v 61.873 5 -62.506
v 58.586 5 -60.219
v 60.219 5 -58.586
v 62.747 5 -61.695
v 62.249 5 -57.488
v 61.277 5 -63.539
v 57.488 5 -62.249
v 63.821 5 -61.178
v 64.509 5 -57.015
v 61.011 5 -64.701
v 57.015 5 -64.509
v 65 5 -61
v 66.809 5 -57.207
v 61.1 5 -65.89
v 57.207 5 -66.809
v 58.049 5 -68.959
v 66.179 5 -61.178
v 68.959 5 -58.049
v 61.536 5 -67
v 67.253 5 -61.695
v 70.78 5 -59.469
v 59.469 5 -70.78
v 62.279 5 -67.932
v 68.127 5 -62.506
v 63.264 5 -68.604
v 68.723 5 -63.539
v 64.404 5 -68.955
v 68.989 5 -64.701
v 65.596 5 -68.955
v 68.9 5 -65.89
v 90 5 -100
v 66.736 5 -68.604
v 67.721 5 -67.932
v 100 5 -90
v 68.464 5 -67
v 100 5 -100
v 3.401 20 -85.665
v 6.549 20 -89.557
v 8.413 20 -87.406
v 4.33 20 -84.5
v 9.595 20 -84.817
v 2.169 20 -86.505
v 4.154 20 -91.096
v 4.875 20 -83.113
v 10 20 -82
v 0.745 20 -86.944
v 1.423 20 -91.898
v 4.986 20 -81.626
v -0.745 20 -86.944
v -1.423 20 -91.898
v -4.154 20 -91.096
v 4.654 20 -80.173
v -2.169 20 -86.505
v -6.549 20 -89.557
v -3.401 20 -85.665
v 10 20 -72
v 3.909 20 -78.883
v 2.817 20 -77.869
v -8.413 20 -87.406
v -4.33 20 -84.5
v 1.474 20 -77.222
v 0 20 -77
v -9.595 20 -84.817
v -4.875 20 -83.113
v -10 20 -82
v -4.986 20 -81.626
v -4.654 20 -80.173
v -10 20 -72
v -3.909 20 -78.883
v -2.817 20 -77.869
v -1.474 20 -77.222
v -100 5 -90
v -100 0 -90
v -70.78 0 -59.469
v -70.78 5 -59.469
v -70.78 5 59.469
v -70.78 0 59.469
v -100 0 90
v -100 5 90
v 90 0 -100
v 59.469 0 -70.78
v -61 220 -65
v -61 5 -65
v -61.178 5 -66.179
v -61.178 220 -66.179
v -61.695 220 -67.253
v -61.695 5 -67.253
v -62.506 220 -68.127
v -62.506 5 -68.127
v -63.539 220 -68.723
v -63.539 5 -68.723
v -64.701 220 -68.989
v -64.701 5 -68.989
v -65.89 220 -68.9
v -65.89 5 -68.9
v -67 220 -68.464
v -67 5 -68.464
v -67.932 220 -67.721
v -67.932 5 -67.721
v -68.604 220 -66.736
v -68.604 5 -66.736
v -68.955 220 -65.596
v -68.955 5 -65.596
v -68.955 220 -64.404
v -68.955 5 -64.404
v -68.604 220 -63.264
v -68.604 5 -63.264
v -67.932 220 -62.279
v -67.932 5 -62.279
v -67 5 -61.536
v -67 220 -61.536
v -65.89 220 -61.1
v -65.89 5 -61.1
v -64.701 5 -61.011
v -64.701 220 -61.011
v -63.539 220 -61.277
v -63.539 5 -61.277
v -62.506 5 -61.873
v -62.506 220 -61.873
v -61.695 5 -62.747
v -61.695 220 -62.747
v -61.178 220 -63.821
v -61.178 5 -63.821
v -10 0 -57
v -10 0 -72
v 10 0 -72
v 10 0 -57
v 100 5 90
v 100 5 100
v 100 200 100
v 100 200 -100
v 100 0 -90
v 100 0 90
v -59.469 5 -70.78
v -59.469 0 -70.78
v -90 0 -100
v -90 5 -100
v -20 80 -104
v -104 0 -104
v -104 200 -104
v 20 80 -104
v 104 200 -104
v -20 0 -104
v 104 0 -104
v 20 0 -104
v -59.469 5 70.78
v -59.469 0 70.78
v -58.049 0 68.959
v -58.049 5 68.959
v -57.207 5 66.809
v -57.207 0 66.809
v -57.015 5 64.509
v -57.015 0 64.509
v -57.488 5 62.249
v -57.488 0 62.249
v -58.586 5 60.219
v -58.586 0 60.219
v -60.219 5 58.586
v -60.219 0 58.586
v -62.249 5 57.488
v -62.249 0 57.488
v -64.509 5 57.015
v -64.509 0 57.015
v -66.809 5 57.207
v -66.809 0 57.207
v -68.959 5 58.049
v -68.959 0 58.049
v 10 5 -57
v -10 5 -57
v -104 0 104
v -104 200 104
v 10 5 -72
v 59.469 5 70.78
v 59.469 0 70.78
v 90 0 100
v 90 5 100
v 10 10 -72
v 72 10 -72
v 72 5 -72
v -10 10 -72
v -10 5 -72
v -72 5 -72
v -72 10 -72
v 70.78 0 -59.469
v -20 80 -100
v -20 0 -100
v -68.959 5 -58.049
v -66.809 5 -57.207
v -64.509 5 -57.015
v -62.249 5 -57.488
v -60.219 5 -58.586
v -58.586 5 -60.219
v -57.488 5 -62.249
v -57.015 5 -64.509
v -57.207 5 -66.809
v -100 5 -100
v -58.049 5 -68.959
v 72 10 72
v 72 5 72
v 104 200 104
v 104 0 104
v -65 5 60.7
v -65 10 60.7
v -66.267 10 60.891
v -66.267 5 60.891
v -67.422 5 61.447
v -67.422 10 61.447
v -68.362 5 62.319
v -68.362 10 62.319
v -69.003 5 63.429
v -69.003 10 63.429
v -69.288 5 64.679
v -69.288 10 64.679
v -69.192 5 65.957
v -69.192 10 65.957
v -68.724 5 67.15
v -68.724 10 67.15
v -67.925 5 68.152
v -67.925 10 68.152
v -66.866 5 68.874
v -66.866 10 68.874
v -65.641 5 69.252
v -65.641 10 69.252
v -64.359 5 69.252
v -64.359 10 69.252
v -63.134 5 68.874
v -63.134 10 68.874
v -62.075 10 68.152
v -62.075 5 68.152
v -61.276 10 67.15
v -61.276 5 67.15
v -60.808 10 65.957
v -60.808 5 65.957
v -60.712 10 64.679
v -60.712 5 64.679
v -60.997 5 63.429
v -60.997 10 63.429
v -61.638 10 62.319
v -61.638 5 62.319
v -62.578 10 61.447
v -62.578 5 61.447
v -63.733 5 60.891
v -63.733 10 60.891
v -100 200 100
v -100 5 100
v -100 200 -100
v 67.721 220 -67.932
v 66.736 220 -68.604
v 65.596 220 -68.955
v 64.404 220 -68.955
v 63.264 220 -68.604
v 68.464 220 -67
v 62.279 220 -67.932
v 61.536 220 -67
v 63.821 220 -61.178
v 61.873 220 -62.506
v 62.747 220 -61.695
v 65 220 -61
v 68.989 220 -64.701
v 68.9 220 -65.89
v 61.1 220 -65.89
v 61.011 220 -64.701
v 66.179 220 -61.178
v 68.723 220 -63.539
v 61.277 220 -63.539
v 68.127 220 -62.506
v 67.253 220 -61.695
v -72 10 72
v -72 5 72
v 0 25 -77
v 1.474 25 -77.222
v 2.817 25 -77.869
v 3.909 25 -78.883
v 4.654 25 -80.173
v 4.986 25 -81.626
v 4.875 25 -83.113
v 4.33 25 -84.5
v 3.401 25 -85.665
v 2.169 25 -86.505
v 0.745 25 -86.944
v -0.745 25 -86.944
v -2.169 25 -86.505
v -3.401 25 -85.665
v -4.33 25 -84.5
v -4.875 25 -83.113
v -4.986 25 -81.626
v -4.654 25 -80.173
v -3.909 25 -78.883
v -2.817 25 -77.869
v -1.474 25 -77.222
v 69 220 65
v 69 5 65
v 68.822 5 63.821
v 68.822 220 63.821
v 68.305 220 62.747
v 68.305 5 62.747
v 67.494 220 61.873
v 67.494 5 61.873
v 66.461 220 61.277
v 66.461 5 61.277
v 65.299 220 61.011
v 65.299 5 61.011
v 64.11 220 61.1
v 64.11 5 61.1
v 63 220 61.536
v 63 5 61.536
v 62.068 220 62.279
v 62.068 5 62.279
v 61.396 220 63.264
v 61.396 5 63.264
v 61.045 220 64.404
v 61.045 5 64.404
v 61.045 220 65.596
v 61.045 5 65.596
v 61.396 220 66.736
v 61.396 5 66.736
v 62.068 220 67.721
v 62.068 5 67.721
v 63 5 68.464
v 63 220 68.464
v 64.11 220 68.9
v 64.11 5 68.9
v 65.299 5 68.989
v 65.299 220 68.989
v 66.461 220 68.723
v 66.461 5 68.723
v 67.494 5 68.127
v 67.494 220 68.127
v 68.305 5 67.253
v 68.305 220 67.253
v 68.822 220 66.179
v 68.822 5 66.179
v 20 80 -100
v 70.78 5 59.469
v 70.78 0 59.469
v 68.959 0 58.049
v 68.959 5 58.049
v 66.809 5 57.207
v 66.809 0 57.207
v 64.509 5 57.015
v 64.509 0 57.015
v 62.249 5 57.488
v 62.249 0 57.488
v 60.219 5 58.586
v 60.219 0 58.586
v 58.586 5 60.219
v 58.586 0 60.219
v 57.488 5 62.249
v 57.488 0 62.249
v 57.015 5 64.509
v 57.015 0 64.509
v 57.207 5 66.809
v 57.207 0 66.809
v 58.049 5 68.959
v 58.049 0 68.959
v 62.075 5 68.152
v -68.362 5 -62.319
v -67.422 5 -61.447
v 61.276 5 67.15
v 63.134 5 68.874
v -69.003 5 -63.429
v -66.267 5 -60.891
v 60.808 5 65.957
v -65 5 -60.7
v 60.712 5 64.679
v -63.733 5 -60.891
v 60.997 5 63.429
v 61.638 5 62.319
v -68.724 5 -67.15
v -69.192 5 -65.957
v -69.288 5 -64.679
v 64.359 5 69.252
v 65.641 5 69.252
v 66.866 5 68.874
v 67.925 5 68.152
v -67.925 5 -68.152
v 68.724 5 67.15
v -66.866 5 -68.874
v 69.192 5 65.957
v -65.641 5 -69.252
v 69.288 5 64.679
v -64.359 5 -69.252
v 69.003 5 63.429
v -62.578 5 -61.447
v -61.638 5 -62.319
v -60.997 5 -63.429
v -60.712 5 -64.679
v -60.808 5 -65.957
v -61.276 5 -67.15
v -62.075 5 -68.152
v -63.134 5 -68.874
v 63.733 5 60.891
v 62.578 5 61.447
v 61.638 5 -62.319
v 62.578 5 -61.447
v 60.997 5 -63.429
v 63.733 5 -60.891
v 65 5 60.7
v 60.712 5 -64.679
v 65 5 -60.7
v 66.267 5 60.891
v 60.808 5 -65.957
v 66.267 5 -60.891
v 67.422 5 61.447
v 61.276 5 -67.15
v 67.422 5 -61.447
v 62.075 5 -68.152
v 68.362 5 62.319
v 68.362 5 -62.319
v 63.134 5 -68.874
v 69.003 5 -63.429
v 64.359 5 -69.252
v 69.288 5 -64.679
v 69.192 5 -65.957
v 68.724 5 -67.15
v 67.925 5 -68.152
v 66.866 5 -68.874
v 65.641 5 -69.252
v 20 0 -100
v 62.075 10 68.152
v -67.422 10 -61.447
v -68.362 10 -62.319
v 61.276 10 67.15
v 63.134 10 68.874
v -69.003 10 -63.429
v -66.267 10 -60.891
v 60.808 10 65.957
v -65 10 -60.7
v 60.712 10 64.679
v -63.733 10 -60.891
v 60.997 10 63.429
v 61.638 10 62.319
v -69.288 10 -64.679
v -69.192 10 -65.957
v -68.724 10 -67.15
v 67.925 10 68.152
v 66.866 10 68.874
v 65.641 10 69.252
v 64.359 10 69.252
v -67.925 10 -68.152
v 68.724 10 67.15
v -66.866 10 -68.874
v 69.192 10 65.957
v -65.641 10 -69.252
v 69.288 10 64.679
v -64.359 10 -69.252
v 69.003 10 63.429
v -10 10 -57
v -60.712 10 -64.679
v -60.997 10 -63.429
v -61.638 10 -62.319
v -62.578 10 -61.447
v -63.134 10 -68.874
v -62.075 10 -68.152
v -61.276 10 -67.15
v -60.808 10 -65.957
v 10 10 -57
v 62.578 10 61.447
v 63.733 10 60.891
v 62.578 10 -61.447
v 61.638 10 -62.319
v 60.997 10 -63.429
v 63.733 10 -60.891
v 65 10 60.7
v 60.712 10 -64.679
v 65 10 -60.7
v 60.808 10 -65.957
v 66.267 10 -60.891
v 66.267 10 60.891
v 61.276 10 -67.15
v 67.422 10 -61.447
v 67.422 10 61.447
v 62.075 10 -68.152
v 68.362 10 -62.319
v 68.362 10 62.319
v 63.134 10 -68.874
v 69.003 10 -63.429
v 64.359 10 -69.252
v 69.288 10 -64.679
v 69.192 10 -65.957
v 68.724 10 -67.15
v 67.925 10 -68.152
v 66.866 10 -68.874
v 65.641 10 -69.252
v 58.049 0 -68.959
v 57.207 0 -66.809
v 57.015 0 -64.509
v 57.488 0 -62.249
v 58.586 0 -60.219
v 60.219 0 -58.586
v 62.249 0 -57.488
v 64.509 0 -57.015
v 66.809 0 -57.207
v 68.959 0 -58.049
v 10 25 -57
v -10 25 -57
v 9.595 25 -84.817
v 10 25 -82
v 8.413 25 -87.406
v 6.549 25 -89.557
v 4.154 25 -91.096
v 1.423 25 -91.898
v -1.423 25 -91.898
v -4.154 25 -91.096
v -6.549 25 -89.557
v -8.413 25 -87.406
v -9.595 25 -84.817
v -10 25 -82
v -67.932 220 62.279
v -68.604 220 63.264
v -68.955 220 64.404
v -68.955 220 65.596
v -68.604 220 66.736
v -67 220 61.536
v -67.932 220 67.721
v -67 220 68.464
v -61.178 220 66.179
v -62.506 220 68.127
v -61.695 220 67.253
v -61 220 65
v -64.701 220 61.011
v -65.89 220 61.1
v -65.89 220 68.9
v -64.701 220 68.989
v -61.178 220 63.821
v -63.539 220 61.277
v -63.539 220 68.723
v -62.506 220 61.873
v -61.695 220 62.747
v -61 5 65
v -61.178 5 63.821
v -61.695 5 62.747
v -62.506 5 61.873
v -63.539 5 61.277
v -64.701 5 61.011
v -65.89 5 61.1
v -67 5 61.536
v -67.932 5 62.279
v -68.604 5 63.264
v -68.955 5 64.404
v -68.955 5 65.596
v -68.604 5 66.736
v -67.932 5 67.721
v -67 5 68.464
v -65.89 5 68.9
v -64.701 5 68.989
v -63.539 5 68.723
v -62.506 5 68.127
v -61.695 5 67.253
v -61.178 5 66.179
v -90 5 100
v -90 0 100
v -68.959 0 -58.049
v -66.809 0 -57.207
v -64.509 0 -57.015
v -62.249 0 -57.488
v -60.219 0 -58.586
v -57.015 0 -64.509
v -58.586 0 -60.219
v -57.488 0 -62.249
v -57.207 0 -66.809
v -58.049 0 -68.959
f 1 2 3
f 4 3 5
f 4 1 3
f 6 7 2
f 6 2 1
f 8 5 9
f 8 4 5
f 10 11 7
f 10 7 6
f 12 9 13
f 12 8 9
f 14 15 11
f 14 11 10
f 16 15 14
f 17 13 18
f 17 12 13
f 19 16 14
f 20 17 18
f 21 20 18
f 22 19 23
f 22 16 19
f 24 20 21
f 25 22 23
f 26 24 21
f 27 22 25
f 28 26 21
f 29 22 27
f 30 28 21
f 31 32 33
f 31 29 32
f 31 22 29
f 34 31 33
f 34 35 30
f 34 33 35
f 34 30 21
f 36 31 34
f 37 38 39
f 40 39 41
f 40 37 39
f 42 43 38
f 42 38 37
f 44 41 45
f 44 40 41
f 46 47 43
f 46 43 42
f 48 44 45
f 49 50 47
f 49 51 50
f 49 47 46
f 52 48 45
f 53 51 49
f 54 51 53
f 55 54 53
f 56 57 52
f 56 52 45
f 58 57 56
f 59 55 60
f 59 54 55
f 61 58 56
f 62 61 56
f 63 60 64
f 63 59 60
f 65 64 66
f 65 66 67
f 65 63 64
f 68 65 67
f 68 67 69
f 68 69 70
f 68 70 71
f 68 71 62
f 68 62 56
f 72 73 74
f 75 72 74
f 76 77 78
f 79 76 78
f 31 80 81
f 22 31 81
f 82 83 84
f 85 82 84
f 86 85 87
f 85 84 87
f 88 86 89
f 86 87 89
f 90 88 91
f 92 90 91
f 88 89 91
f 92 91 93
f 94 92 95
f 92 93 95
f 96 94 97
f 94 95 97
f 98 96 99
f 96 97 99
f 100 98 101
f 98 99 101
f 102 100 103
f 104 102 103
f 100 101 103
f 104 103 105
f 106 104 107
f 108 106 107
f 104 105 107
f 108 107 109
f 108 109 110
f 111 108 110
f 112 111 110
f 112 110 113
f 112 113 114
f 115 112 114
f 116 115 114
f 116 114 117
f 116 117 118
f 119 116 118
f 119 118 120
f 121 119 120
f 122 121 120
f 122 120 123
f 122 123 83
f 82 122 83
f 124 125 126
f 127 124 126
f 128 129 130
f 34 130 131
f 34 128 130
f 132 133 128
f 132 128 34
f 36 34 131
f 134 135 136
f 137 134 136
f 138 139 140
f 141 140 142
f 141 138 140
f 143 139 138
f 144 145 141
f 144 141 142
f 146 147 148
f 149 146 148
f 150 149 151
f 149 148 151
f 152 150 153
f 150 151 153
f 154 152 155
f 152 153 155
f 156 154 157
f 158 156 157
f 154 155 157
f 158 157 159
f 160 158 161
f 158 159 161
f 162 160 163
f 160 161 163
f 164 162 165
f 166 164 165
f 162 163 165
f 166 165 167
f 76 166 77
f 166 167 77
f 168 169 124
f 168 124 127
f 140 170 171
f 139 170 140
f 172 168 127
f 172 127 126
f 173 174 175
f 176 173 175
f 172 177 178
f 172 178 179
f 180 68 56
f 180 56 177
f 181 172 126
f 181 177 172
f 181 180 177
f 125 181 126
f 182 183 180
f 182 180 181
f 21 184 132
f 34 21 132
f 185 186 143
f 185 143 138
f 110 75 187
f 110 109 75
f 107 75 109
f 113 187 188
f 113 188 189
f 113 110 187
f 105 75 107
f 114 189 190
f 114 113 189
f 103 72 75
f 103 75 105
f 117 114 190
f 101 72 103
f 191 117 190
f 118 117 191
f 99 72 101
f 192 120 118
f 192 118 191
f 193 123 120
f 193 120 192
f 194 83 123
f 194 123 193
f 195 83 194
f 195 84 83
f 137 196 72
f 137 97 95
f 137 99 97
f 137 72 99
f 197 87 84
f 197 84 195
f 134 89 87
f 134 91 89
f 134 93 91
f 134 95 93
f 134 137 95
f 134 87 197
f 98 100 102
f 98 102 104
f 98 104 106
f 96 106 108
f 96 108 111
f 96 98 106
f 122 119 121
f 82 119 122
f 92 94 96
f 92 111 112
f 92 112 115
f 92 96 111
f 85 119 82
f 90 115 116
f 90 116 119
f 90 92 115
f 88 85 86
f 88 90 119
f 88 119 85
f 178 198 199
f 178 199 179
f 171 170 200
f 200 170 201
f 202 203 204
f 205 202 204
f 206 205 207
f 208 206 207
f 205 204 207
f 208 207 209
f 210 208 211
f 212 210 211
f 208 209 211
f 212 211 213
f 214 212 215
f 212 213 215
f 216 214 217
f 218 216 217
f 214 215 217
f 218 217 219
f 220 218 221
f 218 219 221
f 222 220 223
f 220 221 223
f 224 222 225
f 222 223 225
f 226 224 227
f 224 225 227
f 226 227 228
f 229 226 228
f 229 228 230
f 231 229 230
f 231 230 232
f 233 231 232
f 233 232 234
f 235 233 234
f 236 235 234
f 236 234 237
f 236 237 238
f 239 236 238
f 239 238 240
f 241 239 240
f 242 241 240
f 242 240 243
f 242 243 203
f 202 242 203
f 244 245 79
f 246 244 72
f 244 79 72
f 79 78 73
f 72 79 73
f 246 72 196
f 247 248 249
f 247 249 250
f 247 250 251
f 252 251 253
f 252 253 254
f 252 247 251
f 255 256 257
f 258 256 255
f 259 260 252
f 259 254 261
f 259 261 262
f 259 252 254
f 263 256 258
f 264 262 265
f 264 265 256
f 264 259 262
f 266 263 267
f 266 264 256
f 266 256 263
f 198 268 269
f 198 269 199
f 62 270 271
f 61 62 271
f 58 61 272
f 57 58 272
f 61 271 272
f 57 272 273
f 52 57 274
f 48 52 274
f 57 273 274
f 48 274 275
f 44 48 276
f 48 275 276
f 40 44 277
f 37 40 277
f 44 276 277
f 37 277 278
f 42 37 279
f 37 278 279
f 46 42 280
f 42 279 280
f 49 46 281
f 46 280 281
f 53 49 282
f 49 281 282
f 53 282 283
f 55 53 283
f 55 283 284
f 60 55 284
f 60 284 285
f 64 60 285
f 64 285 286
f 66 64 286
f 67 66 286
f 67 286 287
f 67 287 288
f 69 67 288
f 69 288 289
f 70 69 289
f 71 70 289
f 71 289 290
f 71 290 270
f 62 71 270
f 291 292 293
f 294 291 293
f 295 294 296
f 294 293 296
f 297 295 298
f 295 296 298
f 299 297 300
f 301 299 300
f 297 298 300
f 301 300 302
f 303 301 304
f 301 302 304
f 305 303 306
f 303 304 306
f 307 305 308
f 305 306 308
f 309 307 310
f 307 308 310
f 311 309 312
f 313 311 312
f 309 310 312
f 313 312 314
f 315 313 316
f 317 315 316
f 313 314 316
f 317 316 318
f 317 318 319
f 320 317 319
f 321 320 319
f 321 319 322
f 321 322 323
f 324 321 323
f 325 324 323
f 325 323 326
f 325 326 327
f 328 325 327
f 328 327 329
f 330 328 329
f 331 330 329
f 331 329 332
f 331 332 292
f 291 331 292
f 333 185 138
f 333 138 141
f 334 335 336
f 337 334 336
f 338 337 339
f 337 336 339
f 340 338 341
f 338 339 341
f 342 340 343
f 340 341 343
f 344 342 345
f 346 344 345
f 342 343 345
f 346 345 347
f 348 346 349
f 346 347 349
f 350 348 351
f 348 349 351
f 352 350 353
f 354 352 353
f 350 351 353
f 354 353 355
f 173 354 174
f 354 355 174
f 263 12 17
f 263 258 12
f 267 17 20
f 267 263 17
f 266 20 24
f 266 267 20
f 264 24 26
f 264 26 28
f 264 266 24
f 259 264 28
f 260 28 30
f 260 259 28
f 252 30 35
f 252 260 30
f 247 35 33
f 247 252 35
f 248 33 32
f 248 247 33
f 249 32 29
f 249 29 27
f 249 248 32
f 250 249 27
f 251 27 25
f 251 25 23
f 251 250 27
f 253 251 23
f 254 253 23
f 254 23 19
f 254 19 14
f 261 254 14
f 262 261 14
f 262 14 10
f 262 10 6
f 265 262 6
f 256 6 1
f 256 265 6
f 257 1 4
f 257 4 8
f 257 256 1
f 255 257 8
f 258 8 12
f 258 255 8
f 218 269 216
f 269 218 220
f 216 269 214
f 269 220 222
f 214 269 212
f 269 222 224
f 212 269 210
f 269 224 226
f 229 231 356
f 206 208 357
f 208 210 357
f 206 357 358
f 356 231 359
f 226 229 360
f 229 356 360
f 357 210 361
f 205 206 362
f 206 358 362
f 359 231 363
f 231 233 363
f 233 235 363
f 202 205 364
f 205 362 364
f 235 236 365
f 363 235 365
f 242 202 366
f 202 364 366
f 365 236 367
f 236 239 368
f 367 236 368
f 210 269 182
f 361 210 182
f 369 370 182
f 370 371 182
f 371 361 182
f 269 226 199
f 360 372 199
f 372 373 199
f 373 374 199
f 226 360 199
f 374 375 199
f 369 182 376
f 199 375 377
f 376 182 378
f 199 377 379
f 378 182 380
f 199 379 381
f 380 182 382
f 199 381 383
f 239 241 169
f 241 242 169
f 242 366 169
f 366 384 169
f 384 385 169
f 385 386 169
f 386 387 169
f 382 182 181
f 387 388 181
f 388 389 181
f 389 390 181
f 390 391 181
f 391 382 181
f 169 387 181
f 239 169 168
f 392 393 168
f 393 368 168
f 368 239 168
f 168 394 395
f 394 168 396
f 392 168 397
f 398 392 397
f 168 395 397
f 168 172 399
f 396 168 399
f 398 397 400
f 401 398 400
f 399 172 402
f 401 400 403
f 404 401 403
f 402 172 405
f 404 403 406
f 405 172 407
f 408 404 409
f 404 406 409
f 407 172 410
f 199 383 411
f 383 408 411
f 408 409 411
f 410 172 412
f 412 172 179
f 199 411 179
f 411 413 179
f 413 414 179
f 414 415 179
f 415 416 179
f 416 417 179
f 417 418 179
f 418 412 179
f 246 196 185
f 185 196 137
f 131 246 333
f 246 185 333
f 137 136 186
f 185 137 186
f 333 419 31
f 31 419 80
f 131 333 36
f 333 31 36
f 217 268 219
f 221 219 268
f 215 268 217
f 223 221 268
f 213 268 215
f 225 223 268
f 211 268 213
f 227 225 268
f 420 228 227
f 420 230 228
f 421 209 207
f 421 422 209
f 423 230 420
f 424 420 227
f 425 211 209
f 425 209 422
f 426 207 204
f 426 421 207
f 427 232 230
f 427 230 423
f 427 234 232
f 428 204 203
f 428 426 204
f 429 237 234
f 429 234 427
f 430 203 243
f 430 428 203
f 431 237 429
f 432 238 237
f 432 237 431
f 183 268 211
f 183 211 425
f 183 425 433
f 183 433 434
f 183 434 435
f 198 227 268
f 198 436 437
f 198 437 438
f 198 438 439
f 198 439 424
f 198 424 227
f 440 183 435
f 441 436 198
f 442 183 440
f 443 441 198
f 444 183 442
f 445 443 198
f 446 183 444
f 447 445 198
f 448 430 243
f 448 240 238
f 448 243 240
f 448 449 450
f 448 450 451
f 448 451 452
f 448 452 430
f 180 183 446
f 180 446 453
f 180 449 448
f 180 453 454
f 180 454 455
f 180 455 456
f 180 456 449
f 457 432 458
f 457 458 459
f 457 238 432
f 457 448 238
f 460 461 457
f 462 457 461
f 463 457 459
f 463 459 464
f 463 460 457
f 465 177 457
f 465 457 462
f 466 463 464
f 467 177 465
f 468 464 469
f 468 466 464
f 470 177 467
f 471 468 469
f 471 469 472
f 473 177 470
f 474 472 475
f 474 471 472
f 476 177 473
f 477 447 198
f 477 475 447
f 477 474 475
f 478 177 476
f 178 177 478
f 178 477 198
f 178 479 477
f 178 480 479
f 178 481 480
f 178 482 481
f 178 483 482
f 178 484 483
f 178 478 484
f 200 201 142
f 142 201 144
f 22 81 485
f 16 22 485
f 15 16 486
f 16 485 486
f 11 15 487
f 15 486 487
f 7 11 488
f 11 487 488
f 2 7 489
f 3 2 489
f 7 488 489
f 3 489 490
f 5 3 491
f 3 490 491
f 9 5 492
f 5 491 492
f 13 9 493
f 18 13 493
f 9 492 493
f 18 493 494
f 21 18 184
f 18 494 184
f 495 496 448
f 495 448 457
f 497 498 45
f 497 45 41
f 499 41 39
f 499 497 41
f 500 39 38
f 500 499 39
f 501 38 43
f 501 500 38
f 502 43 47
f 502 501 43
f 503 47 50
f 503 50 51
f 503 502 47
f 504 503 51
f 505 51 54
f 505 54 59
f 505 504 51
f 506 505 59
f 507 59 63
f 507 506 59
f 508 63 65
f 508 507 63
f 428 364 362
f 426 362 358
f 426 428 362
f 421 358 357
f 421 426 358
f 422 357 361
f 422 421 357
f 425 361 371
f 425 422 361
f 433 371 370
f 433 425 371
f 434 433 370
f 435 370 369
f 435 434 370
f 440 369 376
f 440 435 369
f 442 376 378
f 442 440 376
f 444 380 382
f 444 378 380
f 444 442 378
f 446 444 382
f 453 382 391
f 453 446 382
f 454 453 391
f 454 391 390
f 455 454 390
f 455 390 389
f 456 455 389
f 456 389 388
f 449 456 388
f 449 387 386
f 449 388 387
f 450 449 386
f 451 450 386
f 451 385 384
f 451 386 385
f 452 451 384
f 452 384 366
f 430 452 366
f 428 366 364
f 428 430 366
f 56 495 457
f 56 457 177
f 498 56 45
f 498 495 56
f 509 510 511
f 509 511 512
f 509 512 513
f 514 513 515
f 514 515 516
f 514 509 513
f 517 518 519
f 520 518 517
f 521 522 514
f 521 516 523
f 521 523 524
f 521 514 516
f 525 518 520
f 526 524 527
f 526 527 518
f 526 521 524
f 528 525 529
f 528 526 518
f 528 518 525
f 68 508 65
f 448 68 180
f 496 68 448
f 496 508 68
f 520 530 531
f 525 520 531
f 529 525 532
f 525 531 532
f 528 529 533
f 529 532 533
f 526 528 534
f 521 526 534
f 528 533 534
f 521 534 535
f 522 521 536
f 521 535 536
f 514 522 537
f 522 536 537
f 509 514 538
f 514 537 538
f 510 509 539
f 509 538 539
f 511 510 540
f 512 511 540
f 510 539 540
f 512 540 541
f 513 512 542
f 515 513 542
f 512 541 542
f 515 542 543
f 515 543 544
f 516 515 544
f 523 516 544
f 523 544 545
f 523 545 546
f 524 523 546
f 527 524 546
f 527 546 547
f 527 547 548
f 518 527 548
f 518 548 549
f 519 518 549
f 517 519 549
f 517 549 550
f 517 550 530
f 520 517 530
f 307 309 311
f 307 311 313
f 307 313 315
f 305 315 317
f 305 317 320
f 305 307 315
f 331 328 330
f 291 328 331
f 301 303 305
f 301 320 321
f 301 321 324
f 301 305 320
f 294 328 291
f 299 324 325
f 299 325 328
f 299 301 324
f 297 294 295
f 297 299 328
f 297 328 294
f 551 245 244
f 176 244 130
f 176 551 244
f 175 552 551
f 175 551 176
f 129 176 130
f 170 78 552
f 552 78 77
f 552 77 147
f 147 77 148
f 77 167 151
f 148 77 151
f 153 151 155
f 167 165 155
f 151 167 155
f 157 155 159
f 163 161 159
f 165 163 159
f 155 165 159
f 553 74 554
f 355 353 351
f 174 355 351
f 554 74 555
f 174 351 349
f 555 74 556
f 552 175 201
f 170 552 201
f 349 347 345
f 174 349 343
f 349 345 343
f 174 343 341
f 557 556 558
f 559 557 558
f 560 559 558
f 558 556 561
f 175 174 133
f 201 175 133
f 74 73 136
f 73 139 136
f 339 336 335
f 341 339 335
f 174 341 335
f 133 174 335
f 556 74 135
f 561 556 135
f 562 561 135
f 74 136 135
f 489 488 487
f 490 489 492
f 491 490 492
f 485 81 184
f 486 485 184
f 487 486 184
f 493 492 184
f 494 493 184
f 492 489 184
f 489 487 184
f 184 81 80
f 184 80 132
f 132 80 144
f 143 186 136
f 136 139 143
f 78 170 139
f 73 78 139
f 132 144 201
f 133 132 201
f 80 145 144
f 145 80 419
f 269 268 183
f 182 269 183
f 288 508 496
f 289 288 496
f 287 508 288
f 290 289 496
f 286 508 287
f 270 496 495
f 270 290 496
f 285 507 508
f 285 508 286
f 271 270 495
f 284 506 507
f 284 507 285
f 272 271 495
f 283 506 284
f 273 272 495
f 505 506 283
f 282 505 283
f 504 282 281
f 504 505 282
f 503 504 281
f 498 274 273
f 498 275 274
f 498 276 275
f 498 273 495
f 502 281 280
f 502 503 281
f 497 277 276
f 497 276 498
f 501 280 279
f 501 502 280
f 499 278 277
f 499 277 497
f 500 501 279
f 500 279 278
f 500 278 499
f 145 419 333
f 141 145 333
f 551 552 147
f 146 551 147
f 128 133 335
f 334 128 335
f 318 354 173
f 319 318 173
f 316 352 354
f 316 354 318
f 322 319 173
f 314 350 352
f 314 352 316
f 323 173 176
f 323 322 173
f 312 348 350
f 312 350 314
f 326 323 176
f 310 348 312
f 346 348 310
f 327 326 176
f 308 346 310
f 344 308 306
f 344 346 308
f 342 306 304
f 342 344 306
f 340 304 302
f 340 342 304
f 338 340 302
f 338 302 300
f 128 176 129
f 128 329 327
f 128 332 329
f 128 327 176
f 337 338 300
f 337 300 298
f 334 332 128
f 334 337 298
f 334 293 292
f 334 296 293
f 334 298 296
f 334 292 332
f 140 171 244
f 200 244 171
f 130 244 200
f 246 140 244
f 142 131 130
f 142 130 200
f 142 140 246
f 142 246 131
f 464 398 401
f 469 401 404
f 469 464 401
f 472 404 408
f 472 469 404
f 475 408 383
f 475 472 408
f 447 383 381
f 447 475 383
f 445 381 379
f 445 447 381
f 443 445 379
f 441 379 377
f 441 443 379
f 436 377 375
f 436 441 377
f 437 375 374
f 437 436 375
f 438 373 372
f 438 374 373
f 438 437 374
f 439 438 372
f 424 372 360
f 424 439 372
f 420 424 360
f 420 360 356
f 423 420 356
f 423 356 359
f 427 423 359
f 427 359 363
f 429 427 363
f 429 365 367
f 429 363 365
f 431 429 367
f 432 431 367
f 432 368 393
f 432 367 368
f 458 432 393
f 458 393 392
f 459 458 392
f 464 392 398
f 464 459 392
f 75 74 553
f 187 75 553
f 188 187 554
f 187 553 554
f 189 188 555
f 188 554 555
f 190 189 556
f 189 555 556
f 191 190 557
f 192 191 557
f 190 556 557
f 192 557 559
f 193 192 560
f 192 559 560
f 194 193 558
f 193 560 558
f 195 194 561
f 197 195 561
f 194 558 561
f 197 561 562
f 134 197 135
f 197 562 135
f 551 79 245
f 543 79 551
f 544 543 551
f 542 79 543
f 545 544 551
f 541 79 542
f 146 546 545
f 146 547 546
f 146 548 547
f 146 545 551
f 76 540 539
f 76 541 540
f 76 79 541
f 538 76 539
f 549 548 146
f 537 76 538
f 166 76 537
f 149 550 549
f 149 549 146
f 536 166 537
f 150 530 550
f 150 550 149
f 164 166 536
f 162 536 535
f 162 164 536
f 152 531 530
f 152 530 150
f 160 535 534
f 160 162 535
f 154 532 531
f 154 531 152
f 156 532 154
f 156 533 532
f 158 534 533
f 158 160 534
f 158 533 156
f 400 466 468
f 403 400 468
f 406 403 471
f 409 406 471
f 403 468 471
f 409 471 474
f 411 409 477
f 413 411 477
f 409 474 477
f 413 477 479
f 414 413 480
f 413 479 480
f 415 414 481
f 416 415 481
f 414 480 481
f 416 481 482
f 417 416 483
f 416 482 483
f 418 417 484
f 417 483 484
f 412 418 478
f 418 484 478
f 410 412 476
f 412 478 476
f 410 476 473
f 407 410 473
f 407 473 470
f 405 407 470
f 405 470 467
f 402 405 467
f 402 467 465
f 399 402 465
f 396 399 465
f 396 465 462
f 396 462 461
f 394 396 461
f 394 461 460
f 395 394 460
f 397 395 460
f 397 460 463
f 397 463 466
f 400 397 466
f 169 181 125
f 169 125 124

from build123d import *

# Parameters (mm, degrees)
SKETCH1_W                                  = 208
SKETCH1_H                                  = 208
SKETCH1_W_2                                = 200
SKETCH1_H_2                                = 200
BOSS_EXTRUDE1_DEPTH                        = 200
SKETCH3_W                                  = 40
SKETCH3_H                                  = 80
CUT_EXTRUDE1_DEPTH                         = 249.257930387
SKETCH4_W                                  = 144
SKETCH4_H                                  = 144
BOSS_EXTRUDE3_DEPTH                        = 5
BOSS_EXTRUDE4_DEPTH                        = 5
SKETCH4_5_R                                = 4
BOSS_EXTRUDE5_DEPTH                        = 210
BOSS_EXTRUDE5_DIRECTION_2_REACH            = 242.275
MIRROR2_OUTLINE_R                          = 4
MIRROR2_DEPTH                              = 220
MIRROR2_2_OUTLINE_R                        = 4
MIRROR2_2_DEPTH                            = 5
SKETCH8_R                                  = 10
BOSS_EXTRUDE7_DEPTH                        = 25
CUT_EXTRUDE3_DEPTH                         = 265.635598512
CUT_EXTRUDE3_DEPTH_BACK                    = 265.635598512
SKETCH11_R                                 = 5
CUT_EXTRUDE4_DEPTH                         = 245.247824965
SKETCH12_R                                 = 4.3
CUT_EXTRUDE5_DEPTH                         = 257.382526706
MIRROR3_AT_THE_SECOND_PLANE_COPY_1_SKETC_R = 4.3
MIRROR3_AT_THE_SECOND_PLANE_COPY_1_DEPTH   = 257.382526706


# Read off the part's stored shape, not the designer's step: Mirror2
with BuildPart() as part:
    # Sketch1 → Boss-Extrude1 (new body)
    with BuildSketch(Plane(origin=(0, 0, 0), x_dir=(1, 0, 0), z_dir=(0, 1, 0))):
        Rectangle(SKETCH1_W, SKETCH1_H)
        Rectangle(SKETCH1_W_2, SKETCH1_H_2, mode=Mode.SUBTRACT)
    extrude(amount=BOSS_EXTRUDE1_DEPTH)

    # Sketch3 → Cut-Extrude1 (cut, through all)
    with BuildSketch(Plane.XY):
        with Locations((0, 40)):
            Rectangle(SKETCH3_W, SKETCH3_H)
    extrude(amount=-CUT_EXTRUDE1_DEPTH, mode=Mode.SUBTRACT)

    # Sketch5 → Boss-Extrude4 (add)
    with BuildSketch(Plane(origin=(0, 0, 0), x_dir=(1, 0, 0), z_dir=(0, 1, 0))):
        with BuildLine():
            Line((90, 100), (59.468591297, 70.779577645))
            ThreePointArc((59.468591297, 70.779577645), (59.343145751, 59.343145751), (70.779577645, 59.468591297))
            Line((70.779577645, 59.468591297), (100, 90))
            Line((100, 90), (100, 100))
            Line((100, 100), (90, 100))
        make_face()
    extrude(amount=BOSS_EXTRUDE4_DEPTH)

    # Sketch4<5> → Boss-Extrude5 (add)
    with BuildSketch(Plane(origin=(0, 10, 0), x_dir=(1, 0, 0), z_dir=(0, 1, 0))):
        with Locations(Location((65, 65, 0), (0, 0, 270))):
            Circle(SKETCH4_5_R)
    extrude(amount=BOSS_EXTRUDE5_DEPTH)

    # Sketch4<5> → Boss-Extrude5 direction 2 (add, up to next)
    with BuildSketch(Plane(origin=(0, 10, 0), x_dir=(1, 0, 0), z_dir=(0, 1, 0)), mode=Mode.PRIVATE) as boss_extrude5_direction_2_sk1:
        with Locations(Location((65, 65, 0), (0, 0, 270))):
            Circle(SKETCH4_5_R)
    boss_extrude5_direction_2_tool1 = extrude(boss_extrude5_direction_2_sk1.sketch, amount=-BOSS_EXTRUDE5_DIRECTION_2_REACH, mode=Mode.PRIVATE) - part.part
    add(boss_extrude5_direction_2_tool1.solids().sort_by_distance((65, 10, -65))[0])



with BuildPart() as body_2:
    # Sketch4 → Boss-Extrude3 (new body)
    with BuildSketch(Plane(origin=(0, 10, 0), x_dir=(1, 0, 0), z_dir=(0, 1, 0))):
        Rectangle(SKETCH4_W, SKETCH4_H)
    extrude(amount=-BOSS_EXTRUDE3_DEPTH)

    # Sketch8 → Boss-Extrude7 (add, through all)
    with BuildSketch(Plane(origin=(0, 25, 0), x_dir=(1, 0, 0), z_dir=(0, 1, 0))):
        with Locations((0, 82)):
            Circle(SKETCH8_R)
        with BuildLine():
            Line((-10, 82), (-10, 57))
            Line((-10, 57), (10, 57))
            Line((10, 57), (10, 82))
            ThreePointArc((10, 82), (0, 72), (-10, 82))
        make_face()
    extrude(amount=-BOSS_EXTRUDE7_DEPTH)

    # Sketch10 → Cut-Extrude3 (cut, two sides: drawn at the far end of the back side and taken through both)
    with BuildSketch(Plane(origin=(0, 0, 0), x_dir=(0, 0, -1), z_dir=(1, 0, 0)).offset(-CUT_EXTRUDE3_DEPTH_BACK)):
        Polygon((665.474932894, 20), (92, 20), (72, 20), (72, 0), (72, -573.474932894), (883.01602778, -1384.490960674), (1476.490960674, -791.01602778), align=None)
    extrude(amount=CUT_EXTRUDE3_DEPTH + CUT_EXTRUDE3_DEPTH_BACK, mode=Mode.SUBTRACT)

    # Sketch11 → Cut-Extrude4 (cut, through all)
    with BuildSketch(Plane(origin=(0, 25, 0), x_dir=(1, 0, 0), z_dir=(0, 1, 0))):
        with Locations(Location((0, 82, 0), (0, 0, 270))):
            Circle(SKETCH11_R)
    extrude(amount=-CUT_EXTRUDE4_DEPTH, mode=Mode.SUBTRACT)

    # Sketch12 → Cut-Extrude5 (cut, through all)
    with BuildSketch(Plane(origin=(0, 10, 0), x_dir=(1, 0, 0), z_dir=(0, 1, 0))):
        with Locations(Location((65, 65, 0), (0, 0, 270))):
            Circle(SKETCH12_R)
    cut_extrude5 = extrude(amount=-CUT_EXTRUDE5_DEPTH, mode=Mode.SUBTRACT)

    # Mirror3: Cut-Extrude5 across plane
    add(cut_extrude5.mirror(Plane.XY), mode=Mode.SUBTRACT)

    # Mirror3 at the second plane: Cut-Extrude5 across plane
    add(cut_extrude5.mirror(Plane(origin=(0, 0, 0), x_dir=(0, 0, 1), z_dir=(1, 0, 0))), mode=Mode.SUBTRACT)

    # Mirror3 at the second plane copy 1 sketc → Mirror3 at the second plane copy 1 (cut, through all)
    with BuildSketch(Plane(origin=(0, 10, 0), x_dir=(-1, 0, 0), z_dir=(0, 1, 0))):
        with Locations(Location((65, 65, 0), (0, 0, 270))):
            Circle(MIRROR3_AT_THE_SECOND_PLANE_COPY_1_SKETC_R)
    extrude(amount=-MIRROR3_AT_THE_SECOND_PLANE_COPY_1_DEPTH, mode=Mode.SUBTRACT)


with BuildPart() as body_3:
    # Mirror2 outline → Mirror2 (new body)
    with BuildSketch(Plane(origin=(0, 0, 0), x_dir=(1, 0, 0), z_dir=(0, 1, 0))):
        with Locations((65, -65)):
            Circle(MIRROR2_OUTLINE_R)
        with Locations((-65, 65)):
            Circle(MIRROR2_OUTLINE_R)
        with Locations((-65, -65)):
            Circle(MIRROR2_OUTLINE_R)
    extrude(amount=MIRROR2_DEPTH)


with BuildPart() as part_1:
    add(part.part)

    add(body_3.part)  # Mirror2 2 merges body 3
    # Mirror2 2 outline → Mirror2 2 (add)
    # profile 1 of 3: a face of its own
    with BuildSketch(Plane(origin=(0, 0, 0), x_dir=(1, 0, 0), z_dir=(0, 1, 0))):
        with BuildLine():
            ThreePointArc((70.779577645, -59.468591297), (59.343145751, -59.343145751), (59.468591297, -70.779577645))
            Line((59.468591297, -70.779577645), (90, -100))
            Line((90, -100), (100, -100))
            Line((100, -100), (100, -90))
            Line((100, -90), (70.779577645, -59.468591297))
        make_face()
        with Locations((65, -65)):
            Circle(MIRROR2_2_OUTLINE_R, mode=Mode.SUBTRACT)
    # profile 2 of 3: a face of its own
    with BuildSketch(Plane(origin=(0, 0, 0), x_dir=(1, 0, 0), z_dir=(0, 1, 0))):
        with BuildLine():
            Line((-100, -100), (-90, -100))
            Line((-90, -100), (-59.468591297, -70.779577645))
            ThreePointArc((-59.468591297, -70.779577645), (-59.343145751, -59.343145751), (-70.779577645, -59.468591297))
            Line((-70.779577645, -59.468591297), (-100, -90))
            Line((-100, -90), (-100, -100))
        make_face()
        with Locations((-65, -65)):
            Circle(MIRROR2_2_OUTLINE_R, mode=Mode.SUBTRACT)
    # profile 3 of 3: a face of its own
    with BuildSketch(Plane(origin=(0, 0, 0), x_dir=(1, 0, 0), z_dir=(0, 1, 0))):
        with BuildLine():
            Line((-59.468591297, 70.779577645), (-90, 100))
            Line((-90, 100), (-100, 100))
            Line((-100, 100), (-100, 90))
            Line((-100, 90), (-70.779577645, 59.468591297))
            ThreePointArc((-70.779577645, 59.468591297), (-59.343145751, 59.343145751), (-59.468591297, 70.779577645))
        make_face()
        with Locations((-65, 65)):
            Circle(MIRROR2_2_OUTLINE_R, mode=Mode.SUBTRACT)
    extrude(amount=MIRROR2_2_DEPTH)


solid = Compound([body_2.part, part_1.part])
